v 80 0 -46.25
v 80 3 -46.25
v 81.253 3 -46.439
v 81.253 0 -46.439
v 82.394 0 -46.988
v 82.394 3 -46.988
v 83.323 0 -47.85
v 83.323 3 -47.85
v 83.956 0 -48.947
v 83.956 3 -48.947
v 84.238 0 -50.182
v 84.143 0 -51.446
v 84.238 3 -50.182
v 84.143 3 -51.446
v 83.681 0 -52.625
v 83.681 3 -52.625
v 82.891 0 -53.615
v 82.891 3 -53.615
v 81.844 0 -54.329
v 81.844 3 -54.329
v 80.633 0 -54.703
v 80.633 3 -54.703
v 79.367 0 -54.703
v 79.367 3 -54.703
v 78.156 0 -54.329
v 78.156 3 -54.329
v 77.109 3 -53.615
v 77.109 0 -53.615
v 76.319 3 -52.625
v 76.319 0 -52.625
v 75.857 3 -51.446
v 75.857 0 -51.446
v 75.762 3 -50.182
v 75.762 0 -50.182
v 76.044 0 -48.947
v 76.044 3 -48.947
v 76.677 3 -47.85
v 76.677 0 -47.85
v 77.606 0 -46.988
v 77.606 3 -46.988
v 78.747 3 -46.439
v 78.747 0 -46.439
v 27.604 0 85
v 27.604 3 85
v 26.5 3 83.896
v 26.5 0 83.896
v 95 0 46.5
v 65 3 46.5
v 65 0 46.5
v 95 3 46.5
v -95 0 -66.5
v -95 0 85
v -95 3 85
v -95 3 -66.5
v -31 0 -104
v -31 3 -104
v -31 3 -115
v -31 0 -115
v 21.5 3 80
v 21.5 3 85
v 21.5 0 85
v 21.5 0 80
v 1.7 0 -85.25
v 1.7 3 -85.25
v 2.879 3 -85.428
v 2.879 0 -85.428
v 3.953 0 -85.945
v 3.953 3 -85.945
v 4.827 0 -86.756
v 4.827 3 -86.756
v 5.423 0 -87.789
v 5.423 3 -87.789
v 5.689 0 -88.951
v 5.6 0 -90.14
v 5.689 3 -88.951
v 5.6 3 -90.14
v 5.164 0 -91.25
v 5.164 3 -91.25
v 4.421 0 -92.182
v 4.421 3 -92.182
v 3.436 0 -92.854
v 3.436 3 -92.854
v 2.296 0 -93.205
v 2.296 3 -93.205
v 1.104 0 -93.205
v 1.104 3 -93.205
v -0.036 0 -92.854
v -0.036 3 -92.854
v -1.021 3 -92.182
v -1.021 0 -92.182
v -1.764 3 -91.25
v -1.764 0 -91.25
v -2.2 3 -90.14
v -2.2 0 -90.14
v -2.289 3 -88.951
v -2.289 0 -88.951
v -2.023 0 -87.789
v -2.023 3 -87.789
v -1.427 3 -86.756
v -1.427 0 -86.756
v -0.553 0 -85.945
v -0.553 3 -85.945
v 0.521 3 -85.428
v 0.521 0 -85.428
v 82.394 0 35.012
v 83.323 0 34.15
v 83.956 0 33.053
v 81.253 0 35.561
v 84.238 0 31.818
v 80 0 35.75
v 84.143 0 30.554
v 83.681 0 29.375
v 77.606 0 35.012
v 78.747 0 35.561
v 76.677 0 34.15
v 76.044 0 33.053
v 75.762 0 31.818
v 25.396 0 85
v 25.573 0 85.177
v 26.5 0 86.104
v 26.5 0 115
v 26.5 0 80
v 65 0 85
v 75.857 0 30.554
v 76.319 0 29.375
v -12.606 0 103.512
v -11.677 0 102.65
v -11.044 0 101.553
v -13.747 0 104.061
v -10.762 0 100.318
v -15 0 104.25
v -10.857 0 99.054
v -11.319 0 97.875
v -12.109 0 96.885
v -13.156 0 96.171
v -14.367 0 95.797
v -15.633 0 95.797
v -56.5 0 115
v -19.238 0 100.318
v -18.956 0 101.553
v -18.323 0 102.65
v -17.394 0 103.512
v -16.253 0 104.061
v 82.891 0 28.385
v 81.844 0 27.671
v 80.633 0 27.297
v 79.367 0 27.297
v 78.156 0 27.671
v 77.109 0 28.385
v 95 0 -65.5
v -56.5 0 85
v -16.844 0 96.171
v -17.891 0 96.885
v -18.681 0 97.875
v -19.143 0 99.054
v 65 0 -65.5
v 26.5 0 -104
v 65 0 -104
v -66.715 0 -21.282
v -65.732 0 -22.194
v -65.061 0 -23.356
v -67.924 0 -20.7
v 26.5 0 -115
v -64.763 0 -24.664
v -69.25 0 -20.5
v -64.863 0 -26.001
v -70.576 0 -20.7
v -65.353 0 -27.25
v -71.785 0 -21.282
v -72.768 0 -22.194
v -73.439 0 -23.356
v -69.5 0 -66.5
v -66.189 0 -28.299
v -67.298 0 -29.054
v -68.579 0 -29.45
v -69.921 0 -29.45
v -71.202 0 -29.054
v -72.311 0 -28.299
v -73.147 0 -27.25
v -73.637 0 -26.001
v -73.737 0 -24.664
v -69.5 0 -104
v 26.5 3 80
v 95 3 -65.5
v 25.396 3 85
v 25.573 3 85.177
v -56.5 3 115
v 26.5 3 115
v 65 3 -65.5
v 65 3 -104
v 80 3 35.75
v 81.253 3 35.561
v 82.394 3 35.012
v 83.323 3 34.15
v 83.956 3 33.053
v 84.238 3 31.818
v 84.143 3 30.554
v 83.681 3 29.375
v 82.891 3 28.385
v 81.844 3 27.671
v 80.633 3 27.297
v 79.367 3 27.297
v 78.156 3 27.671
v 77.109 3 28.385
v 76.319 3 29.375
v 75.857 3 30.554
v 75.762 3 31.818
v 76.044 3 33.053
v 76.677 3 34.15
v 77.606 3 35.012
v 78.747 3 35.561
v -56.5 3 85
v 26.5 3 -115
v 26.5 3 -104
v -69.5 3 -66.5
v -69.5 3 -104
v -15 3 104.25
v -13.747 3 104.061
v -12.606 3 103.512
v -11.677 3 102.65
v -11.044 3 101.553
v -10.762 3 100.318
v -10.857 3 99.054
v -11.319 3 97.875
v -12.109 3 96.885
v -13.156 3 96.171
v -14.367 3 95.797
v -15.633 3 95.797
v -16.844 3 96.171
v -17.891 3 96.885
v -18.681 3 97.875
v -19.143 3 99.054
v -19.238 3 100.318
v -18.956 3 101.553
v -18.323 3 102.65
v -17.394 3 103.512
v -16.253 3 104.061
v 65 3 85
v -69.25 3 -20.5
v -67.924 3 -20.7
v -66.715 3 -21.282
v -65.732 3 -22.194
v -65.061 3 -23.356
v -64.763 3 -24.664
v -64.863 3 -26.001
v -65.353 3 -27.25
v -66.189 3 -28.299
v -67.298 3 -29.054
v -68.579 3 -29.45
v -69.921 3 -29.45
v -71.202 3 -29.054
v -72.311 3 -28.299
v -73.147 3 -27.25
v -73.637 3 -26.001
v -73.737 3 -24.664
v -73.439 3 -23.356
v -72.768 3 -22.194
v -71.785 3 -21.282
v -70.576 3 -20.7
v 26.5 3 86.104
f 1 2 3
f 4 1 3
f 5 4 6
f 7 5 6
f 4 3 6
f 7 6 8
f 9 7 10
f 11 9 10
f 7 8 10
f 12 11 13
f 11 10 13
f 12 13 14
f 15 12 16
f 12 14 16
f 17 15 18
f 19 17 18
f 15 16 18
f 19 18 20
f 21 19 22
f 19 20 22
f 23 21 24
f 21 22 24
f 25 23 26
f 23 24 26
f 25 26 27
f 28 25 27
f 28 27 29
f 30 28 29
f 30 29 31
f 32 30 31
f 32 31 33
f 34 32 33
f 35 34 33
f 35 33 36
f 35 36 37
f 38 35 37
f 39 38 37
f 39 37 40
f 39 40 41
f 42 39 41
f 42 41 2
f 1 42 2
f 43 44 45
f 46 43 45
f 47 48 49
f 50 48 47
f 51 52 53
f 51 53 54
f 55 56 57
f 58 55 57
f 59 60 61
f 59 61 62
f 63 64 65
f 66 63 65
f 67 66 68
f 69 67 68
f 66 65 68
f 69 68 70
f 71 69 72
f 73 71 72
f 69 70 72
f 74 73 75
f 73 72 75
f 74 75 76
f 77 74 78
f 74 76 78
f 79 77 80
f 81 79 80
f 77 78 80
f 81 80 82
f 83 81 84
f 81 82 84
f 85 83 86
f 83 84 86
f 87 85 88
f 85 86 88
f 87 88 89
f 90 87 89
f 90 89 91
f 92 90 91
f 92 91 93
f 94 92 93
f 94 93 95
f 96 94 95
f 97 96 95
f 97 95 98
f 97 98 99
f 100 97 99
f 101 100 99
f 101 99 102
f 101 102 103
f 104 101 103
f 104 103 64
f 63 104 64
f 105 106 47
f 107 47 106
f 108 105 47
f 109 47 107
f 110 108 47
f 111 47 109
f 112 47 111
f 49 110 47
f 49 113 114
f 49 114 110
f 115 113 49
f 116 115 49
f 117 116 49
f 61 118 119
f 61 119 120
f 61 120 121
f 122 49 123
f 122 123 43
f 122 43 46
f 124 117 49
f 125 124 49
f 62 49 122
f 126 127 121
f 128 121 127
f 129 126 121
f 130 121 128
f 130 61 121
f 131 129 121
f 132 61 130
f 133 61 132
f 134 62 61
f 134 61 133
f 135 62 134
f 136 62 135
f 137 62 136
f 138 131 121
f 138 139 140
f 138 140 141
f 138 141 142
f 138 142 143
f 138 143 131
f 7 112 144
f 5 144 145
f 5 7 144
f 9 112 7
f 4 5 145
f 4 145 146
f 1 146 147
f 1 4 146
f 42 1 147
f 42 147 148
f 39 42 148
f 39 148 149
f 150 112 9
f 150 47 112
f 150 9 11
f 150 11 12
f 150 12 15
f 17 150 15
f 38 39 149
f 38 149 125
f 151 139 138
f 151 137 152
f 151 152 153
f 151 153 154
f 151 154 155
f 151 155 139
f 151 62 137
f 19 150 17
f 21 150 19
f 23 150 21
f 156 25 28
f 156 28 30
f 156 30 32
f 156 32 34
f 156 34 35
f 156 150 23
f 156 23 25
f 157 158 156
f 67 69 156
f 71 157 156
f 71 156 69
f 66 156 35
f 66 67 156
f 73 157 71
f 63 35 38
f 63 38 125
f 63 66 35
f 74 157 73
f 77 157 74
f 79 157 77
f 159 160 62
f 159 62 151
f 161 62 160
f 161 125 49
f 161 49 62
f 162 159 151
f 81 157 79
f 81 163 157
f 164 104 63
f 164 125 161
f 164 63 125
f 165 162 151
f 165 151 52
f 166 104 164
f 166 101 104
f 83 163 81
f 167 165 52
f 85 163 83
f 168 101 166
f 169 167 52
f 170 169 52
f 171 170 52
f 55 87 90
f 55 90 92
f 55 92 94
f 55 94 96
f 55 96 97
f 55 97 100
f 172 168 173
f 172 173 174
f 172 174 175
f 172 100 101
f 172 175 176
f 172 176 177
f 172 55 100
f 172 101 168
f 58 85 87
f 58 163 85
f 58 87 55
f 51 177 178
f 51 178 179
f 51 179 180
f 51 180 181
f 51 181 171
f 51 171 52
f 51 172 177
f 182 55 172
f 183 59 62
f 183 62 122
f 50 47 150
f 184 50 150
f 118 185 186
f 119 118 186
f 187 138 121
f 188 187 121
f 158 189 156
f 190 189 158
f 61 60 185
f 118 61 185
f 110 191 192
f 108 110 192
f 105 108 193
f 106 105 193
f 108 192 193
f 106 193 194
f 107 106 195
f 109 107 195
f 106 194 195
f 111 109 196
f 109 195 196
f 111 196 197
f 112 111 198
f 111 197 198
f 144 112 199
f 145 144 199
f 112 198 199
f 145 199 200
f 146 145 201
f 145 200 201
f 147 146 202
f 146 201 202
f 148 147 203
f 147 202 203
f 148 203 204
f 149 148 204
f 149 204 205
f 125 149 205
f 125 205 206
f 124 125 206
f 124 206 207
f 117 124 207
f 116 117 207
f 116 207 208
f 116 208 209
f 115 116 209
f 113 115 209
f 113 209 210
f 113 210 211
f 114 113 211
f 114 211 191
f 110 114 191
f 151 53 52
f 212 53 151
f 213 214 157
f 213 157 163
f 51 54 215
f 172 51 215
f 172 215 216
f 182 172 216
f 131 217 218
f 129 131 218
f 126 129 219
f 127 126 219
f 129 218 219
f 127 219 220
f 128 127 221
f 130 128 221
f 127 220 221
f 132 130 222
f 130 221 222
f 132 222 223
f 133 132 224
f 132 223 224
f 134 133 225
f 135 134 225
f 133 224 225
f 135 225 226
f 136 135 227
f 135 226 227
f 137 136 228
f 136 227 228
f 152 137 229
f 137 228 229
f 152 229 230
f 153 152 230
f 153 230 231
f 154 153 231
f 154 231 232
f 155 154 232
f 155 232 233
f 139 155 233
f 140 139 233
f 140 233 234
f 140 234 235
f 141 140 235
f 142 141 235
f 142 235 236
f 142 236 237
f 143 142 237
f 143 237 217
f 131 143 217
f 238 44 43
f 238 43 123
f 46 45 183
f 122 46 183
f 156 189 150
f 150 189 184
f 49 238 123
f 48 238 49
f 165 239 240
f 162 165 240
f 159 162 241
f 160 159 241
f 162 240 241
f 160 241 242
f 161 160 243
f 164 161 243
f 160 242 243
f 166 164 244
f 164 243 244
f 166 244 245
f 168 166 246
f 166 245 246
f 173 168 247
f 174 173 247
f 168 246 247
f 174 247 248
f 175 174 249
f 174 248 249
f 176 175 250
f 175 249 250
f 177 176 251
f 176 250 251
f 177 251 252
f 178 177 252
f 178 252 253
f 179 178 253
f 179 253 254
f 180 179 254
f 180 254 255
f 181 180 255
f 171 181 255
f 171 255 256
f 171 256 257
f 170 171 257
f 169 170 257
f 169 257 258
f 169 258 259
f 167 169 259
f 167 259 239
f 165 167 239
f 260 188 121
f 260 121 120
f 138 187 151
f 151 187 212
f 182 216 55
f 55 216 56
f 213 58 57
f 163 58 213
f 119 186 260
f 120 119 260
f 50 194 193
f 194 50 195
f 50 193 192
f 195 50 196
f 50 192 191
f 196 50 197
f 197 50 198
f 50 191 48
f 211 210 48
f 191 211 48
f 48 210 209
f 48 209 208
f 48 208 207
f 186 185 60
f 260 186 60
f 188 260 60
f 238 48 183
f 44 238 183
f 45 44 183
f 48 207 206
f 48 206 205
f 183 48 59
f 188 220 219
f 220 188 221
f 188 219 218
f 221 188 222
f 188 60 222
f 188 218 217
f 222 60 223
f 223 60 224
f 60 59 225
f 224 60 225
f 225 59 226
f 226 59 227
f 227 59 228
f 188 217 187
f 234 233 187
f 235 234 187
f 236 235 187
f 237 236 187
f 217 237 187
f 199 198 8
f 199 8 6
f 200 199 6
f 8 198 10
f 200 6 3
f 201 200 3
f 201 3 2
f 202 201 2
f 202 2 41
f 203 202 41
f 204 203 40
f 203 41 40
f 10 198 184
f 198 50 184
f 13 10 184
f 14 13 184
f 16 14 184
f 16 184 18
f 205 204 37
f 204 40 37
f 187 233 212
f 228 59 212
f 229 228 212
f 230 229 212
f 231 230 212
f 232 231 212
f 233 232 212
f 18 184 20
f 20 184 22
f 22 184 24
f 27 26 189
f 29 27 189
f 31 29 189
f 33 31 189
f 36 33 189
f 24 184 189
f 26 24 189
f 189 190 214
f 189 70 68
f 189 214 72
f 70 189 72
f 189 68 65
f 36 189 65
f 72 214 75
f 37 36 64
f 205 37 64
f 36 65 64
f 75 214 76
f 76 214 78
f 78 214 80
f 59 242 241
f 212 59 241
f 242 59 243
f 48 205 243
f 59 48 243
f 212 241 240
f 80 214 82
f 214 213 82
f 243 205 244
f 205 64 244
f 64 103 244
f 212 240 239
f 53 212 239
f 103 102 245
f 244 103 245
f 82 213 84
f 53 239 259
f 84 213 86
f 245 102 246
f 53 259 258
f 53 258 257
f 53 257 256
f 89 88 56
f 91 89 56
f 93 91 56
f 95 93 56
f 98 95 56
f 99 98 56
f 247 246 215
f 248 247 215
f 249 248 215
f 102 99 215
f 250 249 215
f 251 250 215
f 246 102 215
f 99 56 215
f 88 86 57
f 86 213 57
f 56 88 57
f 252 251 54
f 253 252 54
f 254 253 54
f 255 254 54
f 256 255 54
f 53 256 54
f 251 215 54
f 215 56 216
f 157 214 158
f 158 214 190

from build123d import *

# Parameters (mm, degrees)
CROQUIS1_W              = 190
CROQUIS1_H              = 230
SALIENTE_EXTRUIR2_DEPTH = 3
CROQUIS3_W              = 30
CROQUIS3_H              = 30
CORTAR_EXTRUIR1_DEPTH   = 10
CROQUIS5_W              = 38.5
CROQUIS5_H              = 30
CORTAR_EXTRUIR2_DEPTH   = 10
CROQUIS6_W              = 30
CROQUIS6_H              = 38.5
CORTAR_EXTRUIR3_DEPTH   = 10
CROQUIS7_W              = 38.5
CROQUIS7_H              = 30
CORTAR_EXTRUIR4_DEPTH   = 10
CORTAR_EXTRUIR12_DEPTH  = 10
CROQUIS11_W             = 5
CROQUIS11_H             = 5
CORTAR_EXTRUIR13_DEPTH  = 10
CORTAR_EXTRUIR14_DEPTH  = 10
CORTAR_EXTRUIR15_DEPTH  = 10
CORTAR_EXTRUIR16_DEPTH  = 10
CROQUIS15_W             = 30
CROQUIS15_H             = 38.5
CORTAR_EXTRUIR17_DEPTH  = 10
CROQUIS16_W             = 25.5
CROQUIS16_H             = 48.5
CORTAR_EXTRUIR18_DEPTH  = 10
CROQUIS17_W             = 24
CROQUIS17_H             = 11
CORTAR_EXTRUIR19_DEPTH  = 10
CROQUIS18_W             = 14.5
CROQUIS18_H             = 11
CORTAR_EXTRUIR20_DEPTH  = 10
CROQUIS19_R             = 4.25
CORTAR_EXTRUIR21_DEPTH  = 10
CROQUIS20_R             = 4.25
CORTAR_EXTRUIR22_DEPTH  = 10
CROQUIS21_R             = 4.5
CORTAR_EXTRUIR23_DEPTH  = 10
CROQUIS22_R             = 4
CORTAR_EXTRUIR24_DEPTH  = 10
CROQUIS23_W             = 30
CROQUIS23_H             = 38.5
CORTAR_EXTRUIR25_DEPTH  = 10
CROQUIS24_R             = 4.25
CORTAR_EXTRUIR26_DEPTH  = 10
SALIENTE_EXTRUIR4_DEPTH = 3
CROQUIS26_W             = 38.5
CROQUIS26_H             = 11
CORTAR_EXTRUIR27_DEPTH  = 30


with BuildPart() as part:
    # Croquis1 → Saliente-Extruir2 (new body)
    with BuildSketch(Plane(origin=(0, 0, 0), x_dir=(1, 0, 0), z_dir=(0, 1, 0))):
        Rectangle(CROQUIS1_W, CROQUIS1_H)
    extrude(amount=SALIENTE_EXTRUIR2_DEPTH)

    # Croquis3 → Cortar-Extruir1 (cut)
    with BuildSketch(Plane(origin=(0, 3, 0), x_dir=(1, 0, 0), z_dir=(0, 1, 0))):
        with Locations((80, -100)):
            Rectangle(CROQUIS3_W, CROQUIS3_H)
    extrude(amount=-CORTAR_EXTRUIR1_DEPTH, mode=Mode.SUBTRACT)

    # Croquis5 → Cortar-Extruir2 (cut)
    with BuildSketch(Plane(origin=(0, 3, 0), x_dir=(1, 0, 0), z_dir=(0, 1, 0))):
        with Locations((45.75, -100)):
            Rectangle(CROQUIS5_W, CROQUIS5_H)
    extrude(amount=-CORTAR_EXTRUIR2_DEPTH, mode=Mode.SUBTRACT)

    # Croquis6 → Cortar-Extruir3 (cut)
    with BuildSketch(Plane(origin=(0, 3, 0), x_dir=(1, 0, 0), z_dir=(0, 1, 0))):
        with Locations((80, -65.75)):
            Rectangle(CROQUIS6_W, CROQUIS6_H)
    extrude(amount=-CORTAR_EXTRUIR3_DEPTH, mode=Mode.SUBTRACT)

    # Croquis7 → Cortar-Extruir4 (cut)
    with BuildSketch(Plane(origin=(0, 3, 0), x_dir=(1, 0, 0), z_dir=(0, 1, 0))):
        with Locations((-75.75, -100)):
            Rectangle(CROQUIS7_W, CROQUIS7_H)
    extrude(amount=-CORTAR_EXTRUIR4_DEPTH, mode=Mode.SUBTRACT)

    # Croquis9 → Cortar-Extruir12 (cut)
    with BuildSketch(Plane(origin=(0, 3, 0), x_dir=(1, 0, 0), z_dir=(0, 1, 0))):
        Polygon((26.5, -85), (26.5, -85.75), (25.75, -85), (26.5, -84.25), (27.25, -85), align=None)
    extrude(amount=-CORTAR_EXTRUIR12_DEPTH, mode=Mode.SUBTRACT)

    # Croquis11 → Cortar-Extruir13 (cut)
    with BuildSketch(Plane(origin=(0, 3, 0), x_dir=(1, 0, 0), z_dir=(0, 1, 0))):
        with Locations((24, -82.5)):
            Rectangle(CROQUIS11_W, CROQUIS11_H)
    extrude(amount=-CORTAR_EXTRUIR13_DEPTH, mode=Mode.SUBTRACT)

    # Croquis12 → Cortar-Extruir14 (cut)
    with BuildSketch(Plane(origin=(0, 3, 0), x_dir=(1, 0, 0), z_dir=(0, 1, 0))):
        Polygon((26.5, -85.75), (25.75, -85), (25.573223305, -85.176776695), (26.323223305, -85.926776695), align=None)
    extrude(amount=-CORTAR_EXTRUIR14_DEPTH, mode=Mode.SUBTRACT)

    # Croquis13 → Cortar-Extruir15 (cut)
    with BuildSketch(Plane(origin=(0, 3, 0), x_dir=(1, 0, 0), z_dir=(0, 1, 0))):
        Polygon((26.5, -84.25), (27.25, -85), (27.426776695, -84.823223305), (26.676776695, -84.073223305), align=None)
    extrude(amount=-CORTAR_EXTRUIR15_DEPTH, mode=Mode.SUBTRACT)

    # Croquis14 → Cortar-Extruir16 (cut)
    with BuildSketch(Plane(origin=(0, 3, 0), x_dir=(1, 0, 0), z_dir=(0, 1, 0))):
        Polygon((25.573223305, -85.176776695), (25.75, -85), (25.002200766, -84.252200766), (24.82542407, -84.428977461), align=None)
        Polygon((26.323223305, -85.926776695), (26.5, -85.75), (26.914058622, -86.164058622), (26.737281927, -86.340835317), align=None)
        Polygon((27.426776695, -84.823223305), (27.25, -85), (27.599112283, -85.349112283), (27.775888978, -85.172335588), align=None)
        Polygon((26.676776695, -84.073223305), (26.5, -84.25), (26.076932461, -83.826932461), (26.253709156, -83.650155766), align=None)
    extrude(amount=-CORTAR_EXTRUIR16_DEPTH, mode=Mode.SUBTRACT)

    # Croquis15 → Cortar-Extruir17 (cut)
    with BuildSketch(Plane(origin=(0, 3, 0), x_dir=(1, 0, 0), z_dir=(0, 1, 0))):
        with Locations((80, 95.75)):
            Rectangle(CROQUIS15_W, CROQUIS15_H)
    extrude(amount=-CORTAR_EXTRUIR17_DEPTH, mode=Mode.SUBTRACT)

    # Croquis16 → Cortar-Extruir18 (cut)
    with BuildSketch(Plane(origin=(0, 3, 0), x_dir=(1, 0, 0), z_dir=(0, 1, 0))):
        with Locations((-82.25, 90.75)):
            Rectangle(CROQUIS16_W, CROQUIS16_H)
    extrude(amount=-CORTAR_EXTRUIR18_DEPTH, mode=Mode.SUBTRACT)

    # Croquis17 → Cortar-Extruir19 (cut)
    with BuildSketch(Plane(origin=(0, 3, 0), x_dir=(1, 0, 0), z_dir=(0, 1, 0))):
        with Locations((-57.5, 109.5)):
            Rectangle(CROQUIS17_W, CROQUIS17_H)
    extrude(amount=-CORTAR_EXTRUIR19_DEPTH, mode=Mode.SUBTRACT)

    # Croquis18 → Cortar-Extruir20 (cut)
    with BuildSketch(Plane(origin=(0, 3, 0), x_dir=(1, 0, 0), z_dir=(0, 1, 0))):
        with Locations((-38.25, 109.5)):
            Rectangle(CROQUIS18_W, CROQUIS18_H)
    extrude(amount=-CORTAR_EXTRUIR20_DEPTH, mode=Mode.SUBTRACT)

    # Croquis19 → Cortar-Extruir21 (cut)
    with BuildSketch(Plane(origin=(0, 3, 0), x_dir=(1, 0, 0), z_dir=(0, 1, 0))):
        with Locations(Location((80, 61.5, 0), (0, 0, 270))):
            Circle(CROQUIS19_R)
        with Locations(Location((80, -31.5, 0), (0, 0, 270))):
            Circle(CROQUIS19_R)
    extrude(amount=-CORTAR_EXTRUIR21_DEPTH, mode=Mode.SUBTRACT)

    # Croquis20 → Cortar-Extruir22 (cut)
    with BuildSketch(Plane(origin=(0, 3, 0), x_dir=(1, 0, 0), z_dir=(0, 1, 0))):
        with Locations(Location((-15, -100, 0), (0, 0, 270))):
            Circle(CROQUIS20_R)
    extrude(amount=-CORTAR_EXTRUIR22_DEPTH, mode=Mode.SUBTRACT)

    # Croquis21 → Cortar-Extruir23 (cut)
    with BuildSketch(Plane(origin=(0, 3, 0), x_dir=(1, 0, 0), z_dir=(0, 1, 0))):
        with Locations(Location((-69.25, 25, 0), (0, 0, 270))):
            Circle(CROQUIS21_R)
    extrude(amount=-CORTAR_EXTRUIR23_DEPTH, mode=Mode.SUBTRACT)

    # Croquis22 → Cortar-Extruir24 (cut)
    with BuildSketch(Plane(origin=(0, 3, 0), x_dir=(1, 0, 0), z_dir=(0, 1, 0))):
        with Locations(Location((1.7, 89.25, 0), (0, 0, 270))):
            Circle(CROQUIS22_R)
    extrude(amount=-CORTAR_EXTRUIR24_DEPTH, mode=Mode.SUBTRACT)

    # Croquis23 → Cortar-Extruir25 (cut)
    with BuildSketch(Plane(origin=(0, 3, 0), x_dir=(1, 0, 0), z_dir=(0, 1, 0))):
        with Locations((80, 84.75)):
            Rectangle(CROQUIS23_W, CROQUIS23_H)
    extrude(amount=-CORTAR_EXTRUIR25_DEPTH, mode=Mode.SUBTRACT)

    # Croquis24 → Cortar-Extruir26 (cut)
    with BuildSketch(Plane(origin=(0, 3, 0), x_dir=(1, 0, 0), z_dir=(0, 1, 0))):
        with Locations(Location((80, 50.5, 0), (0, 0, 270))):
            Circle(CROQUIS24_R)
    extrude(amount=-CORTAR_EXTRUIR26_DEPTH, mode=Mode.SUBTRACT)

    # Croquis25 → Saliente-Extruir4 (add)
    with BuildSketch(Plane(origin=(0, 3, 0), x_dir=(1, 0, 0), z_dir=(0, 1, 0))):
        with BuildLine():
            Line((78.563859338, 65.5), (81.436140662, 65.5))
            ThreePointArc((81.436140662, 65.5), (80, 57.25), (78.563859338, 65.5))
        make_face()
    extrude(amount=-SALIENTE_EXTRUIR4_DEPTH)

    # Croquis26 → Cortar-Extruir27 (cut)
    with BuildSketch(Plane(origin=(0, 3, 0), x_dir=(1, 0, 0), z_dir=(0, 1, 0))):
        with Locations((45.75, 109.5)):
            Rectangle(CROQUIS26_W, CROQUIS26_H)
    extrude(amount=-CORTAR_EXTRUIR27_DEPTH, mode=Mode.SUBTRACT)


solid = part.part
